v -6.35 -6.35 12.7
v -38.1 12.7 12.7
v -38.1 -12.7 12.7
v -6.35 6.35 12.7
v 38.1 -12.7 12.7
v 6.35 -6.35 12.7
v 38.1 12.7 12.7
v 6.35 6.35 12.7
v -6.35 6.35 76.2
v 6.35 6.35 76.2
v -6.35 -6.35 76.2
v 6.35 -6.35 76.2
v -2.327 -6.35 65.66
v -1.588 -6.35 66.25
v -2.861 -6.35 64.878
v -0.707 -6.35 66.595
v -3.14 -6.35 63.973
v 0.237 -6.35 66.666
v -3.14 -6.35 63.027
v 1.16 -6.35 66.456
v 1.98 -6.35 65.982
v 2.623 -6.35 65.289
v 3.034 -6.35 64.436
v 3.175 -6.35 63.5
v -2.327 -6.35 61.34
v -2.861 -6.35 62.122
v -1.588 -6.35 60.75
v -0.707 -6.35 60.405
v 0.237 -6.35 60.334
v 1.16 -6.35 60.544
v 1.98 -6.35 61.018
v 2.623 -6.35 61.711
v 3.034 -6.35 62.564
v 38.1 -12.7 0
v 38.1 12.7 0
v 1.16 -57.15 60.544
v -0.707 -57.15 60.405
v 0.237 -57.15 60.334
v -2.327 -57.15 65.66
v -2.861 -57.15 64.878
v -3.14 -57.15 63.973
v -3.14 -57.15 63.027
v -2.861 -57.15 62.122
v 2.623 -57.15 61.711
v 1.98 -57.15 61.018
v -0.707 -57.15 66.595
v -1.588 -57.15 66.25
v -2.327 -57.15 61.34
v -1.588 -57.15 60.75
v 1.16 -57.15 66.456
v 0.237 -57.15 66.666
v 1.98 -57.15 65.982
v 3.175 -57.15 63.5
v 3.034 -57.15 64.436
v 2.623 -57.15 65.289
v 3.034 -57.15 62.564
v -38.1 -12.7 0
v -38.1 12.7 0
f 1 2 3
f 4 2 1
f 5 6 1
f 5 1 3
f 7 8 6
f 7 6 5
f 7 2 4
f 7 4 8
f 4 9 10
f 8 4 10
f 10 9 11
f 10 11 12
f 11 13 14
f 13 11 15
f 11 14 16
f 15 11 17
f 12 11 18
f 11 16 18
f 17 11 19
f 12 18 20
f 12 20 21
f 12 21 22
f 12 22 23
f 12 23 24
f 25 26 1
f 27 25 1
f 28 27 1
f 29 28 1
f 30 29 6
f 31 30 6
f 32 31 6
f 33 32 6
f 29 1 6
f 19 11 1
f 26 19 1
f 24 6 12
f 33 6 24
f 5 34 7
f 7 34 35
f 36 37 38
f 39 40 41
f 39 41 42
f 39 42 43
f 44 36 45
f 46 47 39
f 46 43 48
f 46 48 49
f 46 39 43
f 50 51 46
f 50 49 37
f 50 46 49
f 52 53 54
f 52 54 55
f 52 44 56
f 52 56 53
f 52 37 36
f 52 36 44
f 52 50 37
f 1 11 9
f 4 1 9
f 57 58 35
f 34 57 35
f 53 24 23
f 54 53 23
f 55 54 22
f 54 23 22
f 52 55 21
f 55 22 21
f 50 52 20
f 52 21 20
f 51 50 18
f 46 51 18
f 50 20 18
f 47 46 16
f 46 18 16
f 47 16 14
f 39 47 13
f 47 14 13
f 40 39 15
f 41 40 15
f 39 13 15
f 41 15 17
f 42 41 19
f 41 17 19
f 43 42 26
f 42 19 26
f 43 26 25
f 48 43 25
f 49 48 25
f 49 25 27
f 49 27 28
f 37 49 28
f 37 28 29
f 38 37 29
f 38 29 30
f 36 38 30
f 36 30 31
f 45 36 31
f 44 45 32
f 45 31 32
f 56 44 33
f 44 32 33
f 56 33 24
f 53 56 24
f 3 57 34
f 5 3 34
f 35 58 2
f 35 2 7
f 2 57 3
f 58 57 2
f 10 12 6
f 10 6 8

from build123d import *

# Parameters (mm, degrees)
F0_W     = 76.2
F0_H     = 25.4
F1_DEPTH = 12.7
F2_W     = 12.7
F2_H     = 12.7
F3_DEPTH = 63.5
F4_R     = 3.175
F5_DEPTH = 50.8


with BuildPart() as f1:
    # F0 (on Top) → F1 (new body)
    with BuildSketch(Plane.XY):
        Rectangle(F0_W, F0_H)
    extrude(amount=F1_DEPTH)

    # F2 (on face) → F3 (join)
    with BuildSketch(Plane.XY.offset(12.7)):
        Rectangle(F2_W, F2_H)
    extrude(amount=F3_DEPTH)

    # F4 (on face) → F5 (join)
    with BuildSketch(Plane.XZ.offset(6.35)):
        with Locations((0, 63.5)):
            Circle(F4_R)
    extrude(amount=F5_DEPTH)


solid = f1.part
